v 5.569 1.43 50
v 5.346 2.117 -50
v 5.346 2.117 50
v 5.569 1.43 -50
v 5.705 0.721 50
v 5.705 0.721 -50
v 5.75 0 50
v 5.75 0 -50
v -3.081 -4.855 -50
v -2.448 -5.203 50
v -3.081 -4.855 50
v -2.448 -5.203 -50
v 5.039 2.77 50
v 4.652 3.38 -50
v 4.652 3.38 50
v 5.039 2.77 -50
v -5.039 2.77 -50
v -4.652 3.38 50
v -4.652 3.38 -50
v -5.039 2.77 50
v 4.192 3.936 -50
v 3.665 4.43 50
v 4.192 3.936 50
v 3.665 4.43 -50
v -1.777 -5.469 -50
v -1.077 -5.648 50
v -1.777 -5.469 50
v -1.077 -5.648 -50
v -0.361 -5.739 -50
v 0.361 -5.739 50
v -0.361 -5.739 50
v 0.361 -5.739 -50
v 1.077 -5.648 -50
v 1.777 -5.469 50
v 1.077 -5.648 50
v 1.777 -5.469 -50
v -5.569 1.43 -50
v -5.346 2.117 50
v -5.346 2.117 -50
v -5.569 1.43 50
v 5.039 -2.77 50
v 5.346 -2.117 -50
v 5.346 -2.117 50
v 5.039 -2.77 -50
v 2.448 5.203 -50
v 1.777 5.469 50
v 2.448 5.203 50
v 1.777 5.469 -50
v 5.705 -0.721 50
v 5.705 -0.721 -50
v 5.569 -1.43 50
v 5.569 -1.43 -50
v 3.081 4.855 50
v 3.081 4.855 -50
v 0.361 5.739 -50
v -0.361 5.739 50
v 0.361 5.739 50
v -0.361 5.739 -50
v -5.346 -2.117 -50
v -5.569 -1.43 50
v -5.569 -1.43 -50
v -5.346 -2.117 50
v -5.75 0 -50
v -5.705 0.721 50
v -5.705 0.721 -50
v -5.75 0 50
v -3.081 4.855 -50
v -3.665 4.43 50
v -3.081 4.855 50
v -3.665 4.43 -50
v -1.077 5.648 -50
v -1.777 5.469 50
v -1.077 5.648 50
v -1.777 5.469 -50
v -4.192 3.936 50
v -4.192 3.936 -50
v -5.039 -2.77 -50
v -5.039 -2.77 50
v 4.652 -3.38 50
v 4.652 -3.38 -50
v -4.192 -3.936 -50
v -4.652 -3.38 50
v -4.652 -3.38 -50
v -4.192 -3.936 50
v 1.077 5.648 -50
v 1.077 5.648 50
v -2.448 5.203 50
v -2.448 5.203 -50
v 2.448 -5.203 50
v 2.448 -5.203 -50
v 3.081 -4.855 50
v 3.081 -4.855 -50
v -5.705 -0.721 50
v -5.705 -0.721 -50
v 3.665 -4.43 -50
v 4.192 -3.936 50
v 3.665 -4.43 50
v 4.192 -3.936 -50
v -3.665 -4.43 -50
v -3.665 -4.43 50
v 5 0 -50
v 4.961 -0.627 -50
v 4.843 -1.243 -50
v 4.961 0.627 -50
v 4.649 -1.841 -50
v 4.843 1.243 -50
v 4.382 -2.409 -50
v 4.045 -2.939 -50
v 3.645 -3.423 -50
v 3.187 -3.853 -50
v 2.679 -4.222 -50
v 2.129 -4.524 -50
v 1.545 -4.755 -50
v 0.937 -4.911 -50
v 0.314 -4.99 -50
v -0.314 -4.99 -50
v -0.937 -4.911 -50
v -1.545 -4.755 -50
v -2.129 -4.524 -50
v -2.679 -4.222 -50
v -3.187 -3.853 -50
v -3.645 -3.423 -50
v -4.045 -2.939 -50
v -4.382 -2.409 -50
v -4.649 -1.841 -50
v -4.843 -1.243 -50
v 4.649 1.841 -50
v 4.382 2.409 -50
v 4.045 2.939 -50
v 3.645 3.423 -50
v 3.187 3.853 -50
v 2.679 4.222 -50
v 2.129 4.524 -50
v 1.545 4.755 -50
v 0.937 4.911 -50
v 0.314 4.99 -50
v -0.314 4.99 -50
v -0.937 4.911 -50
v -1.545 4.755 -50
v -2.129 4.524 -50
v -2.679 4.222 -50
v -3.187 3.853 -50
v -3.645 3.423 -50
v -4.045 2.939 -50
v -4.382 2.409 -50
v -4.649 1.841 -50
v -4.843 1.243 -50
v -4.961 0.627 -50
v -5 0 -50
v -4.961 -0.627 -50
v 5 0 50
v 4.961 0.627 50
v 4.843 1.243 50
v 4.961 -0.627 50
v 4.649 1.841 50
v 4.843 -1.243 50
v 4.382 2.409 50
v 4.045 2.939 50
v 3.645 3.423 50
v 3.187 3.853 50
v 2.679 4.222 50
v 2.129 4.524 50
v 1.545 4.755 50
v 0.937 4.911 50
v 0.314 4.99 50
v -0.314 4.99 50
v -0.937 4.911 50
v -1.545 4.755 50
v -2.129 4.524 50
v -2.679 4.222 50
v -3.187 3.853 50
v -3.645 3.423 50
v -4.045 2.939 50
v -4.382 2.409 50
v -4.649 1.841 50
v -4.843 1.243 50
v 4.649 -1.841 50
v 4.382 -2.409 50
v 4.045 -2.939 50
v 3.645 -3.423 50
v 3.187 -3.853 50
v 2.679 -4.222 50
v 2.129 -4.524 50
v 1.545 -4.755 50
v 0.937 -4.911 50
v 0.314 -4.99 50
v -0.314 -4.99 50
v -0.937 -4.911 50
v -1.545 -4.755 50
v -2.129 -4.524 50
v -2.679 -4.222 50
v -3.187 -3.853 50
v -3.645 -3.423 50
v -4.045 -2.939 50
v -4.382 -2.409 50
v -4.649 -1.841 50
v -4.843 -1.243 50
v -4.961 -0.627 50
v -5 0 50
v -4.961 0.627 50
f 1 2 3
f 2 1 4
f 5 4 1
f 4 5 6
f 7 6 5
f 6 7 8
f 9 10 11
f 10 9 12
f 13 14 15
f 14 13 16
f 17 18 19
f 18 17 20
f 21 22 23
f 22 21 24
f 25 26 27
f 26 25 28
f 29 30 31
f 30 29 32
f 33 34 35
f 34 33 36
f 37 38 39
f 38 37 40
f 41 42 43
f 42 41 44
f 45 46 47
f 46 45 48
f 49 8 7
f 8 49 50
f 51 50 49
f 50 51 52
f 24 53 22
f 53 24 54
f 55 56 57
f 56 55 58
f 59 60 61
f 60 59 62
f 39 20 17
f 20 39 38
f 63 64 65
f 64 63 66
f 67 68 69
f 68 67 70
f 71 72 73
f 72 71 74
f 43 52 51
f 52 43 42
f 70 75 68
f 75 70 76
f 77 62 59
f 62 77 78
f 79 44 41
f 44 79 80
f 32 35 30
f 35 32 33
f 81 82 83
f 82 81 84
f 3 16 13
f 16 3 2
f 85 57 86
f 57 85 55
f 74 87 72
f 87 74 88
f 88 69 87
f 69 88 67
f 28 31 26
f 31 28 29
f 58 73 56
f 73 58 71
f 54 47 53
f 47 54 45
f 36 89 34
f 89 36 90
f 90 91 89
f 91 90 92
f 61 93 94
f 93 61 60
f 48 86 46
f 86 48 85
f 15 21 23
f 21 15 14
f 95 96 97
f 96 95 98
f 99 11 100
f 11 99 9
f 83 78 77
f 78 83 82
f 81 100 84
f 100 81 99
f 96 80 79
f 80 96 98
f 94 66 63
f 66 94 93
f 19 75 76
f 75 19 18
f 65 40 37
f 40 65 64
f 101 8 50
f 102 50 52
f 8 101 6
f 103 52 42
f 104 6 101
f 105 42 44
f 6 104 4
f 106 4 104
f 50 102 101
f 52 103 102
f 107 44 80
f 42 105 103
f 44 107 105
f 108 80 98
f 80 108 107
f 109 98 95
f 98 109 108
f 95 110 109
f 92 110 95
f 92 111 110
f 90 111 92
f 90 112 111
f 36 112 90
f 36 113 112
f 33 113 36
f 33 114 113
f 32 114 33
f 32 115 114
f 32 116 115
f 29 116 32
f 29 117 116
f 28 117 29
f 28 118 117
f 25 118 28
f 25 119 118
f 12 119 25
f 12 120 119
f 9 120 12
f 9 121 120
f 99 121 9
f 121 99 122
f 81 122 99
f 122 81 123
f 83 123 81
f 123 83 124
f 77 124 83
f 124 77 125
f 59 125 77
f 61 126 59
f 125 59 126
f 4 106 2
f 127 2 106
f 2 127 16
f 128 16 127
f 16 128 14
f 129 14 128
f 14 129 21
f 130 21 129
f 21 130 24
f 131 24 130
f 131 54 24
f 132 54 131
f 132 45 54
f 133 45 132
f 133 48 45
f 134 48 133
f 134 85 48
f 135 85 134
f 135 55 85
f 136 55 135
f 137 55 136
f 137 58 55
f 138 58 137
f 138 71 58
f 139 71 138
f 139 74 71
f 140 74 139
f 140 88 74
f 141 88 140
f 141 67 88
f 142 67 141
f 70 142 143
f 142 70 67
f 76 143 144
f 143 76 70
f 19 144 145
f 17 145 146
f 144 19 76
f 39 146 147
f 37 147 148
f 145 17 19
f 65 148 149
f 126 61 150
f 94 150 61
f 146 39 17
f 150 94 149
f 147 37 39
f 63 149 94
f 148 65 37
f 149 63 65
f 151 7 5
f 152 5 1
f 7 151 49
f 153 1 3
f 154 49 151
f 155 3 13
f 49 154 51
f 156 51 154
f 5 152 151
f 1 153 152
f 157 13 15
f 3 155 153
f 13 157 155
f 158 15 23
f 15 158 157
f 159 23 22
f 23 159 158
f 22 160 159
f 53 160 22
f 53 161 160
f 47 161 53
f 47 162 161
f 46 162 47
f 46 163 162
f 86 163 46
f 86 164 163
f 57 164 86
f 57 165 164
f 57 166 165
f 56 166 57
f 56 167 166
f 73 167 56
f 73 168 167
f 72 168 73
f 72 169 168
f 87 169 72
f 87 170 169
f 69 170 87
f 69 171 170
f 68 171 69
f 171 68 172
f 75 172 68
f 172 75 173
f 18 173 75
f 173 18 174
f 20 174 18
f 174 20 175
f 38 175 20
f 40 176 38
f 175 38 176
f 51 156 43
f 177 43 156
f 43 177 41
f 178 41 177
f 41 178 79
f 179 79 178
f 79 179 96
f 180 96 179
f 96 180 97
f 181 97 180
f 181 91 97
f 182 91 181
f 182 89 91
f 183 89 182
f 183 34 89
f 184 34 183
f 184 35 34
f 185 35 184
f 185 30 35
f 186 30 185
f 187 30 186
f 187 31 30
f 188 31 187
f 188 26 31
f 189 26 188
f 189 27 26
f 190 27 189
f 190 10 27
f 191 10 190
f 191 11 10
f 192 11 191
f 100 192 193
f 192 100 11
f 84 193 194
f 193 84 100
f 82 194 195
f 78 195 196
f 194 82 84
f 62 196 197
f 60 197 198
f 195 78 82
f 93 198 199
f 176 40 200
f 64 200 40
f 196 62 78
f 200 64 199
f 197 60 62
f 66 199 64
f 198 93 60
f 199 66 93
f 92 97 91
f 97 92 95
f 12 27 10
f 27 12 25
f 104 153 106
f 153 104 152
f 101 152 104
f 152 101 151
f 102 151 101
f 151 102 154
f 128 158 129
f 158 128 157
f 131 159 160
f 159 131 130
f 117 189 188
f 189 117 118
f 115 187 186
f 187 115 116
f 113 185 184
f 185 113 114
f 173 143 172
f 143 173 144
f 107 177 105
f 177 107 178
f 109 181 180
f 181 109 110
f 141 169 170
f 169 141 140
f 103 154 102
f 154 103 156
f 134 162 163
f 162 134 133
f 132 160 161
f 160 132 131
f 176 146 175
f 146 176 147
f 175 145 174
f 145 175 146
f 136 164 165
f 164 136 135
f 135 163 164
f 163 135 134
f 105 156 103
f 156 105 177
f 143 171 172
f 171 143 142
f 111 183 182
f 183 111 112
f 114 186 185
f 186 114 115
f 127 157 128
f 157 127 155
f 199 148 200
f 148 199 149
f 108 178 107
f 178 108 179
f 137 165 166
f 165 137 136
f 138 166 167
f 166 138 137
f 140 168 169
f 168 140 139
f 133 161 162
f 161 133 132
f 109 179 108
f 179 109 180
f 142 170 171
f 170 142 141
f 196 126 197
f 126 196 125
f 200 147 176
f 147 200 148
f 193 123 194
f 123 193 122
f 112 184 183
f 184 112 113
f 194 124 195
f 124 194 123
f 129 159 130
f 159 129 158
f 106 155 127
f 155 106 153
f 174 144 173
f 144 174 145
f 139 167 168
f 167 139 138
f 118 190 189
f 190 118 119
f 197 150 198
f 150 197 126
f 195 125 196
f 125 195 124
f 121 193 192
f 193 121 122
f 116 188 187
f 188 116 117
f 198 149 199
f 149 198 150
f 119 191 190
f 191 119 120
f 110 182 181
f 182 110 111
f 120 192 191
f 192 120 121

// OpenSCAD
$fn = 50;


difference() {
	union() {
		translate(v = [0, 0, -50.0000000000]) {
			cylinder(h = 100, r = 5.7500000000);
		}
	}
	union() {
		translate(v = [0, 0, -100.0000000000]) {
			cylinder(h = 200, r = 5.0000000000);
		}
	}
}
